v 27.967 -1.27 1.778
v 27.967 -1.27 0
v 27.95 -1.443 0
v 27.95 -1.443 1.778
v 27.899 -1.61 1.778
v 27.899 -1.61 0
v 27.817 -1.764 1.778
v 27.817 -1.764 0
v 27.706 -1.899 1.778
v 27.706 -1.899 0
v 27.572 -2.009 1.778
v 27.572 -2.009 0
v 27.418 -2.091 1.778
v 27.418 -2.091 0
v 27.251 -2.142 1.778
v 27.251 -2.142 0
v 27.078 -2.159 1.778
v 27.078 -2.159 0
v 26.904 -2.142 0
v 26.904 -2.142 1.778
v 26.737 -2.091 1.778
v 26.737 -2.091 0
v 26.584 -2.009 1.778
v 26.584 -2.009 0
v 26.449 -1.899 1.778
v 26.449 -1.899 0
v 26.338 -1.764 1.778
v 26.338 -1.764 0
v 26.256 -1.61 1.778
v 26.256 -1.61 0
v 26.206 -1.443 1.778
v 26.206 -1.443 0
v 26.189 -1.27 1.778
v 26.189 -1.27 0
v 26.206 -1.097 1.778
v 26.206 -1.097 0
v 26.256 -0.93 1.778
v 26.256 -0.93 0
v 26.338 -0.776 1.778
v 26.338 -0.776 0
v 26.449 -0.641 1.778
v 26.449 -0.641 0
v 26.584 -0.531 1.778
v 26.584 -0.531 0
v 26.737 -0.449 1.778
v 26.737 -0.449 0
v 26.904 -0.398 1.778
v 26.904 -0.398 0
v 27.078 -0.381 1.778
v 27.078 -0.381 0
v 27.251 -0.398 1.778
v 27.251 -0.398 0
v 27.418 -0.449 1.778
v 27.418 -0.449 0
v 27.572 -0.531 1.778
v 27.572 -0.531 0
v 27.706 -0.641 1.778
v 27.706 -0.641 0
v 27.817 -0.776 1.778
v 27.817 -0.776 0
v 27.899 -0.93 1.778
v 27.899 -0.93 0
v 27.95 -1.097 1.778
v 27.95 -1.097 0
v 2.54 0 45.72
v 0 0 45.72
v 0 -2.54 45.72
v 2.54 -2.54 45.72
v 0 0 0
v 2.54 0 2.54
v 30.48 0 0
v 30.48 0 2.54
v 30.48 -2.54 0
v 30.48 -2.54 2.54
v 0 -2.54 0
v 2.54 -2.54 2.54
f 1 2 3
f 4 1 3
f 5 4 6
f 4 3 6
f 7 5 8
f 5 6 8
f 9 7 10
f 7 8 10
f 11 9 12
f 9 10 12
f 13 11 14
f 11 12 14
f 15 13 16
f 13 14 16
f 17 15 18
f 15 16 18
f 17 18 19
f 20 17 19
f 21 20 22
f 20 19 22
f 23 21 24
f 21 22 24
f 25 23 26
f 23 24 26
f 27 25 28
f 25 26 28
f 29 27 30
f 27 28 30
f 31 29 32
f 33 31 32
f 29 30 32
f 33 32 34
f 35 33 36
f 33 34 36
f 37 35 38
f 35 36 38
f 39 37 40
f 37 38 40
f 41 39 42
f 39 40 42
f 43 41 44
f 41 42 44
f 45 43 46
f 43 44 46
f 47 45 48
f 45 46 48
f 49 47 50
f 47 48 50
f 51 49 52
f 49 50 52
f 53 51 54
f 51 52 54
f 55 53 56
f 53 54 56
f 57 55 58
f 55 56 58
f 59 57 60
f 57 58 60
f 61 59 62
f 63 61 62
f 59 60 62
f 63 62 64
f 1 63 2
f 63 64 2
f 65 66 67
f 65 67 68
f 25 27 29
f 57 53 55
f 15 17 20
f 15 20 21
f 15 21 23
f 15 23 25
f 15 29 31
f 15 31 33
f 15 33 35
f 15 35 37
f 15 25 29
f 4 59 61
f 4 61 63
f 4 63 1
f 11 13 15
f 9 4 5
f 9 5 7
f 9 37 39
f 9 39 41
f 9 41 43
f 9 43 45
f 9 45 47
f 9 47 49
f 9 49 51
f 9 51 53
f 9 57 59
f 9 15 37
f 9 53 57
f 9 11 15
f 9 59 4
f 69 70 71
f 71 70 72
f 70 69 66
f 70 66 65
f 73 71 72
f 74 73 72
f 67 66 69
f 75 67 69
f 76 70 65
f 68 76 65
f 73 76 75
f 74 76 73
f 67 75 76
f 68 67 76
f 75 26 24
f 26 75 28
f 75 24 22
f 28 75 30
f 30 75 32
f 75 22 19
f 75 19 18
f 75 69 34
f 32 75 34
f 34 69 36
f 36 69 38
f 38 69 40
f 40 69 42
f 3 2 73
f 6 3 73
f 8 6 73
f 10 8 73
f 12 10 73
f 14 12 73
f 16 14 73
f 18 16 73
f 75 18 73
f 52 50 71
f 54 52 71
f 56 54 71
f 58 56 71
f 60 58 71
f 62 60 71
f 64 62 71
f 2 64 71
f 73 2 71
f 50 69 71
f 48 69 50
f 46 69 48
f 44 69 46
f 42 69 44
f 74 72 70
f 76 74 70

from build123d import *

# Parameters (mm, degrees)
F0_W     = 2.54
F0_H     = 2.54
F0_W_2   = 27.94
F0_H_2   = 43.18
F1_DEPTH = 2.54
F3_DEPTH = 1.778


with BuildPart() as f1:
    # F0 (on Front) → F1 (new body)
    with BuildSketch(Plane.XZ):
        with Locations((1.27, 1.27)):
            Rectangle(F0_W, F0_H)
        with Locations((16.51, 1.27)):
            Rectangle(F0_W_2, F0_H)
        with Locations((1.27, 24.13)):
            Rectangle(F0_W, F0_H_2)
    extrude(amount=F1_DEPTH)

    # F2 (on face) → F3 (cut)
    with BuildSketch(Plane(origin=(0, 0, 0), x_dir=(1, 0, 0), z_dir=(0, 0, -1))):
        with BuildLine():
            ThreePointArc((26.188626, 1.27), (27.077626, 0.381), (27.966626, 1.27))
            Line((27.966626, 1.27), (26.188626, 1.27))
        make_face()
        with BuildLine():
            Line((26.188626, 1.27), (27.966626, 1.27))
            ThreePointArc((27.966626, 1.27), (27.077626, 2.159), (26.188626, 1.27))
        make_face()
    extrude(amount=-F3_DEPTH, mode=Mode.SUBTRACT)


solid = f1.part
